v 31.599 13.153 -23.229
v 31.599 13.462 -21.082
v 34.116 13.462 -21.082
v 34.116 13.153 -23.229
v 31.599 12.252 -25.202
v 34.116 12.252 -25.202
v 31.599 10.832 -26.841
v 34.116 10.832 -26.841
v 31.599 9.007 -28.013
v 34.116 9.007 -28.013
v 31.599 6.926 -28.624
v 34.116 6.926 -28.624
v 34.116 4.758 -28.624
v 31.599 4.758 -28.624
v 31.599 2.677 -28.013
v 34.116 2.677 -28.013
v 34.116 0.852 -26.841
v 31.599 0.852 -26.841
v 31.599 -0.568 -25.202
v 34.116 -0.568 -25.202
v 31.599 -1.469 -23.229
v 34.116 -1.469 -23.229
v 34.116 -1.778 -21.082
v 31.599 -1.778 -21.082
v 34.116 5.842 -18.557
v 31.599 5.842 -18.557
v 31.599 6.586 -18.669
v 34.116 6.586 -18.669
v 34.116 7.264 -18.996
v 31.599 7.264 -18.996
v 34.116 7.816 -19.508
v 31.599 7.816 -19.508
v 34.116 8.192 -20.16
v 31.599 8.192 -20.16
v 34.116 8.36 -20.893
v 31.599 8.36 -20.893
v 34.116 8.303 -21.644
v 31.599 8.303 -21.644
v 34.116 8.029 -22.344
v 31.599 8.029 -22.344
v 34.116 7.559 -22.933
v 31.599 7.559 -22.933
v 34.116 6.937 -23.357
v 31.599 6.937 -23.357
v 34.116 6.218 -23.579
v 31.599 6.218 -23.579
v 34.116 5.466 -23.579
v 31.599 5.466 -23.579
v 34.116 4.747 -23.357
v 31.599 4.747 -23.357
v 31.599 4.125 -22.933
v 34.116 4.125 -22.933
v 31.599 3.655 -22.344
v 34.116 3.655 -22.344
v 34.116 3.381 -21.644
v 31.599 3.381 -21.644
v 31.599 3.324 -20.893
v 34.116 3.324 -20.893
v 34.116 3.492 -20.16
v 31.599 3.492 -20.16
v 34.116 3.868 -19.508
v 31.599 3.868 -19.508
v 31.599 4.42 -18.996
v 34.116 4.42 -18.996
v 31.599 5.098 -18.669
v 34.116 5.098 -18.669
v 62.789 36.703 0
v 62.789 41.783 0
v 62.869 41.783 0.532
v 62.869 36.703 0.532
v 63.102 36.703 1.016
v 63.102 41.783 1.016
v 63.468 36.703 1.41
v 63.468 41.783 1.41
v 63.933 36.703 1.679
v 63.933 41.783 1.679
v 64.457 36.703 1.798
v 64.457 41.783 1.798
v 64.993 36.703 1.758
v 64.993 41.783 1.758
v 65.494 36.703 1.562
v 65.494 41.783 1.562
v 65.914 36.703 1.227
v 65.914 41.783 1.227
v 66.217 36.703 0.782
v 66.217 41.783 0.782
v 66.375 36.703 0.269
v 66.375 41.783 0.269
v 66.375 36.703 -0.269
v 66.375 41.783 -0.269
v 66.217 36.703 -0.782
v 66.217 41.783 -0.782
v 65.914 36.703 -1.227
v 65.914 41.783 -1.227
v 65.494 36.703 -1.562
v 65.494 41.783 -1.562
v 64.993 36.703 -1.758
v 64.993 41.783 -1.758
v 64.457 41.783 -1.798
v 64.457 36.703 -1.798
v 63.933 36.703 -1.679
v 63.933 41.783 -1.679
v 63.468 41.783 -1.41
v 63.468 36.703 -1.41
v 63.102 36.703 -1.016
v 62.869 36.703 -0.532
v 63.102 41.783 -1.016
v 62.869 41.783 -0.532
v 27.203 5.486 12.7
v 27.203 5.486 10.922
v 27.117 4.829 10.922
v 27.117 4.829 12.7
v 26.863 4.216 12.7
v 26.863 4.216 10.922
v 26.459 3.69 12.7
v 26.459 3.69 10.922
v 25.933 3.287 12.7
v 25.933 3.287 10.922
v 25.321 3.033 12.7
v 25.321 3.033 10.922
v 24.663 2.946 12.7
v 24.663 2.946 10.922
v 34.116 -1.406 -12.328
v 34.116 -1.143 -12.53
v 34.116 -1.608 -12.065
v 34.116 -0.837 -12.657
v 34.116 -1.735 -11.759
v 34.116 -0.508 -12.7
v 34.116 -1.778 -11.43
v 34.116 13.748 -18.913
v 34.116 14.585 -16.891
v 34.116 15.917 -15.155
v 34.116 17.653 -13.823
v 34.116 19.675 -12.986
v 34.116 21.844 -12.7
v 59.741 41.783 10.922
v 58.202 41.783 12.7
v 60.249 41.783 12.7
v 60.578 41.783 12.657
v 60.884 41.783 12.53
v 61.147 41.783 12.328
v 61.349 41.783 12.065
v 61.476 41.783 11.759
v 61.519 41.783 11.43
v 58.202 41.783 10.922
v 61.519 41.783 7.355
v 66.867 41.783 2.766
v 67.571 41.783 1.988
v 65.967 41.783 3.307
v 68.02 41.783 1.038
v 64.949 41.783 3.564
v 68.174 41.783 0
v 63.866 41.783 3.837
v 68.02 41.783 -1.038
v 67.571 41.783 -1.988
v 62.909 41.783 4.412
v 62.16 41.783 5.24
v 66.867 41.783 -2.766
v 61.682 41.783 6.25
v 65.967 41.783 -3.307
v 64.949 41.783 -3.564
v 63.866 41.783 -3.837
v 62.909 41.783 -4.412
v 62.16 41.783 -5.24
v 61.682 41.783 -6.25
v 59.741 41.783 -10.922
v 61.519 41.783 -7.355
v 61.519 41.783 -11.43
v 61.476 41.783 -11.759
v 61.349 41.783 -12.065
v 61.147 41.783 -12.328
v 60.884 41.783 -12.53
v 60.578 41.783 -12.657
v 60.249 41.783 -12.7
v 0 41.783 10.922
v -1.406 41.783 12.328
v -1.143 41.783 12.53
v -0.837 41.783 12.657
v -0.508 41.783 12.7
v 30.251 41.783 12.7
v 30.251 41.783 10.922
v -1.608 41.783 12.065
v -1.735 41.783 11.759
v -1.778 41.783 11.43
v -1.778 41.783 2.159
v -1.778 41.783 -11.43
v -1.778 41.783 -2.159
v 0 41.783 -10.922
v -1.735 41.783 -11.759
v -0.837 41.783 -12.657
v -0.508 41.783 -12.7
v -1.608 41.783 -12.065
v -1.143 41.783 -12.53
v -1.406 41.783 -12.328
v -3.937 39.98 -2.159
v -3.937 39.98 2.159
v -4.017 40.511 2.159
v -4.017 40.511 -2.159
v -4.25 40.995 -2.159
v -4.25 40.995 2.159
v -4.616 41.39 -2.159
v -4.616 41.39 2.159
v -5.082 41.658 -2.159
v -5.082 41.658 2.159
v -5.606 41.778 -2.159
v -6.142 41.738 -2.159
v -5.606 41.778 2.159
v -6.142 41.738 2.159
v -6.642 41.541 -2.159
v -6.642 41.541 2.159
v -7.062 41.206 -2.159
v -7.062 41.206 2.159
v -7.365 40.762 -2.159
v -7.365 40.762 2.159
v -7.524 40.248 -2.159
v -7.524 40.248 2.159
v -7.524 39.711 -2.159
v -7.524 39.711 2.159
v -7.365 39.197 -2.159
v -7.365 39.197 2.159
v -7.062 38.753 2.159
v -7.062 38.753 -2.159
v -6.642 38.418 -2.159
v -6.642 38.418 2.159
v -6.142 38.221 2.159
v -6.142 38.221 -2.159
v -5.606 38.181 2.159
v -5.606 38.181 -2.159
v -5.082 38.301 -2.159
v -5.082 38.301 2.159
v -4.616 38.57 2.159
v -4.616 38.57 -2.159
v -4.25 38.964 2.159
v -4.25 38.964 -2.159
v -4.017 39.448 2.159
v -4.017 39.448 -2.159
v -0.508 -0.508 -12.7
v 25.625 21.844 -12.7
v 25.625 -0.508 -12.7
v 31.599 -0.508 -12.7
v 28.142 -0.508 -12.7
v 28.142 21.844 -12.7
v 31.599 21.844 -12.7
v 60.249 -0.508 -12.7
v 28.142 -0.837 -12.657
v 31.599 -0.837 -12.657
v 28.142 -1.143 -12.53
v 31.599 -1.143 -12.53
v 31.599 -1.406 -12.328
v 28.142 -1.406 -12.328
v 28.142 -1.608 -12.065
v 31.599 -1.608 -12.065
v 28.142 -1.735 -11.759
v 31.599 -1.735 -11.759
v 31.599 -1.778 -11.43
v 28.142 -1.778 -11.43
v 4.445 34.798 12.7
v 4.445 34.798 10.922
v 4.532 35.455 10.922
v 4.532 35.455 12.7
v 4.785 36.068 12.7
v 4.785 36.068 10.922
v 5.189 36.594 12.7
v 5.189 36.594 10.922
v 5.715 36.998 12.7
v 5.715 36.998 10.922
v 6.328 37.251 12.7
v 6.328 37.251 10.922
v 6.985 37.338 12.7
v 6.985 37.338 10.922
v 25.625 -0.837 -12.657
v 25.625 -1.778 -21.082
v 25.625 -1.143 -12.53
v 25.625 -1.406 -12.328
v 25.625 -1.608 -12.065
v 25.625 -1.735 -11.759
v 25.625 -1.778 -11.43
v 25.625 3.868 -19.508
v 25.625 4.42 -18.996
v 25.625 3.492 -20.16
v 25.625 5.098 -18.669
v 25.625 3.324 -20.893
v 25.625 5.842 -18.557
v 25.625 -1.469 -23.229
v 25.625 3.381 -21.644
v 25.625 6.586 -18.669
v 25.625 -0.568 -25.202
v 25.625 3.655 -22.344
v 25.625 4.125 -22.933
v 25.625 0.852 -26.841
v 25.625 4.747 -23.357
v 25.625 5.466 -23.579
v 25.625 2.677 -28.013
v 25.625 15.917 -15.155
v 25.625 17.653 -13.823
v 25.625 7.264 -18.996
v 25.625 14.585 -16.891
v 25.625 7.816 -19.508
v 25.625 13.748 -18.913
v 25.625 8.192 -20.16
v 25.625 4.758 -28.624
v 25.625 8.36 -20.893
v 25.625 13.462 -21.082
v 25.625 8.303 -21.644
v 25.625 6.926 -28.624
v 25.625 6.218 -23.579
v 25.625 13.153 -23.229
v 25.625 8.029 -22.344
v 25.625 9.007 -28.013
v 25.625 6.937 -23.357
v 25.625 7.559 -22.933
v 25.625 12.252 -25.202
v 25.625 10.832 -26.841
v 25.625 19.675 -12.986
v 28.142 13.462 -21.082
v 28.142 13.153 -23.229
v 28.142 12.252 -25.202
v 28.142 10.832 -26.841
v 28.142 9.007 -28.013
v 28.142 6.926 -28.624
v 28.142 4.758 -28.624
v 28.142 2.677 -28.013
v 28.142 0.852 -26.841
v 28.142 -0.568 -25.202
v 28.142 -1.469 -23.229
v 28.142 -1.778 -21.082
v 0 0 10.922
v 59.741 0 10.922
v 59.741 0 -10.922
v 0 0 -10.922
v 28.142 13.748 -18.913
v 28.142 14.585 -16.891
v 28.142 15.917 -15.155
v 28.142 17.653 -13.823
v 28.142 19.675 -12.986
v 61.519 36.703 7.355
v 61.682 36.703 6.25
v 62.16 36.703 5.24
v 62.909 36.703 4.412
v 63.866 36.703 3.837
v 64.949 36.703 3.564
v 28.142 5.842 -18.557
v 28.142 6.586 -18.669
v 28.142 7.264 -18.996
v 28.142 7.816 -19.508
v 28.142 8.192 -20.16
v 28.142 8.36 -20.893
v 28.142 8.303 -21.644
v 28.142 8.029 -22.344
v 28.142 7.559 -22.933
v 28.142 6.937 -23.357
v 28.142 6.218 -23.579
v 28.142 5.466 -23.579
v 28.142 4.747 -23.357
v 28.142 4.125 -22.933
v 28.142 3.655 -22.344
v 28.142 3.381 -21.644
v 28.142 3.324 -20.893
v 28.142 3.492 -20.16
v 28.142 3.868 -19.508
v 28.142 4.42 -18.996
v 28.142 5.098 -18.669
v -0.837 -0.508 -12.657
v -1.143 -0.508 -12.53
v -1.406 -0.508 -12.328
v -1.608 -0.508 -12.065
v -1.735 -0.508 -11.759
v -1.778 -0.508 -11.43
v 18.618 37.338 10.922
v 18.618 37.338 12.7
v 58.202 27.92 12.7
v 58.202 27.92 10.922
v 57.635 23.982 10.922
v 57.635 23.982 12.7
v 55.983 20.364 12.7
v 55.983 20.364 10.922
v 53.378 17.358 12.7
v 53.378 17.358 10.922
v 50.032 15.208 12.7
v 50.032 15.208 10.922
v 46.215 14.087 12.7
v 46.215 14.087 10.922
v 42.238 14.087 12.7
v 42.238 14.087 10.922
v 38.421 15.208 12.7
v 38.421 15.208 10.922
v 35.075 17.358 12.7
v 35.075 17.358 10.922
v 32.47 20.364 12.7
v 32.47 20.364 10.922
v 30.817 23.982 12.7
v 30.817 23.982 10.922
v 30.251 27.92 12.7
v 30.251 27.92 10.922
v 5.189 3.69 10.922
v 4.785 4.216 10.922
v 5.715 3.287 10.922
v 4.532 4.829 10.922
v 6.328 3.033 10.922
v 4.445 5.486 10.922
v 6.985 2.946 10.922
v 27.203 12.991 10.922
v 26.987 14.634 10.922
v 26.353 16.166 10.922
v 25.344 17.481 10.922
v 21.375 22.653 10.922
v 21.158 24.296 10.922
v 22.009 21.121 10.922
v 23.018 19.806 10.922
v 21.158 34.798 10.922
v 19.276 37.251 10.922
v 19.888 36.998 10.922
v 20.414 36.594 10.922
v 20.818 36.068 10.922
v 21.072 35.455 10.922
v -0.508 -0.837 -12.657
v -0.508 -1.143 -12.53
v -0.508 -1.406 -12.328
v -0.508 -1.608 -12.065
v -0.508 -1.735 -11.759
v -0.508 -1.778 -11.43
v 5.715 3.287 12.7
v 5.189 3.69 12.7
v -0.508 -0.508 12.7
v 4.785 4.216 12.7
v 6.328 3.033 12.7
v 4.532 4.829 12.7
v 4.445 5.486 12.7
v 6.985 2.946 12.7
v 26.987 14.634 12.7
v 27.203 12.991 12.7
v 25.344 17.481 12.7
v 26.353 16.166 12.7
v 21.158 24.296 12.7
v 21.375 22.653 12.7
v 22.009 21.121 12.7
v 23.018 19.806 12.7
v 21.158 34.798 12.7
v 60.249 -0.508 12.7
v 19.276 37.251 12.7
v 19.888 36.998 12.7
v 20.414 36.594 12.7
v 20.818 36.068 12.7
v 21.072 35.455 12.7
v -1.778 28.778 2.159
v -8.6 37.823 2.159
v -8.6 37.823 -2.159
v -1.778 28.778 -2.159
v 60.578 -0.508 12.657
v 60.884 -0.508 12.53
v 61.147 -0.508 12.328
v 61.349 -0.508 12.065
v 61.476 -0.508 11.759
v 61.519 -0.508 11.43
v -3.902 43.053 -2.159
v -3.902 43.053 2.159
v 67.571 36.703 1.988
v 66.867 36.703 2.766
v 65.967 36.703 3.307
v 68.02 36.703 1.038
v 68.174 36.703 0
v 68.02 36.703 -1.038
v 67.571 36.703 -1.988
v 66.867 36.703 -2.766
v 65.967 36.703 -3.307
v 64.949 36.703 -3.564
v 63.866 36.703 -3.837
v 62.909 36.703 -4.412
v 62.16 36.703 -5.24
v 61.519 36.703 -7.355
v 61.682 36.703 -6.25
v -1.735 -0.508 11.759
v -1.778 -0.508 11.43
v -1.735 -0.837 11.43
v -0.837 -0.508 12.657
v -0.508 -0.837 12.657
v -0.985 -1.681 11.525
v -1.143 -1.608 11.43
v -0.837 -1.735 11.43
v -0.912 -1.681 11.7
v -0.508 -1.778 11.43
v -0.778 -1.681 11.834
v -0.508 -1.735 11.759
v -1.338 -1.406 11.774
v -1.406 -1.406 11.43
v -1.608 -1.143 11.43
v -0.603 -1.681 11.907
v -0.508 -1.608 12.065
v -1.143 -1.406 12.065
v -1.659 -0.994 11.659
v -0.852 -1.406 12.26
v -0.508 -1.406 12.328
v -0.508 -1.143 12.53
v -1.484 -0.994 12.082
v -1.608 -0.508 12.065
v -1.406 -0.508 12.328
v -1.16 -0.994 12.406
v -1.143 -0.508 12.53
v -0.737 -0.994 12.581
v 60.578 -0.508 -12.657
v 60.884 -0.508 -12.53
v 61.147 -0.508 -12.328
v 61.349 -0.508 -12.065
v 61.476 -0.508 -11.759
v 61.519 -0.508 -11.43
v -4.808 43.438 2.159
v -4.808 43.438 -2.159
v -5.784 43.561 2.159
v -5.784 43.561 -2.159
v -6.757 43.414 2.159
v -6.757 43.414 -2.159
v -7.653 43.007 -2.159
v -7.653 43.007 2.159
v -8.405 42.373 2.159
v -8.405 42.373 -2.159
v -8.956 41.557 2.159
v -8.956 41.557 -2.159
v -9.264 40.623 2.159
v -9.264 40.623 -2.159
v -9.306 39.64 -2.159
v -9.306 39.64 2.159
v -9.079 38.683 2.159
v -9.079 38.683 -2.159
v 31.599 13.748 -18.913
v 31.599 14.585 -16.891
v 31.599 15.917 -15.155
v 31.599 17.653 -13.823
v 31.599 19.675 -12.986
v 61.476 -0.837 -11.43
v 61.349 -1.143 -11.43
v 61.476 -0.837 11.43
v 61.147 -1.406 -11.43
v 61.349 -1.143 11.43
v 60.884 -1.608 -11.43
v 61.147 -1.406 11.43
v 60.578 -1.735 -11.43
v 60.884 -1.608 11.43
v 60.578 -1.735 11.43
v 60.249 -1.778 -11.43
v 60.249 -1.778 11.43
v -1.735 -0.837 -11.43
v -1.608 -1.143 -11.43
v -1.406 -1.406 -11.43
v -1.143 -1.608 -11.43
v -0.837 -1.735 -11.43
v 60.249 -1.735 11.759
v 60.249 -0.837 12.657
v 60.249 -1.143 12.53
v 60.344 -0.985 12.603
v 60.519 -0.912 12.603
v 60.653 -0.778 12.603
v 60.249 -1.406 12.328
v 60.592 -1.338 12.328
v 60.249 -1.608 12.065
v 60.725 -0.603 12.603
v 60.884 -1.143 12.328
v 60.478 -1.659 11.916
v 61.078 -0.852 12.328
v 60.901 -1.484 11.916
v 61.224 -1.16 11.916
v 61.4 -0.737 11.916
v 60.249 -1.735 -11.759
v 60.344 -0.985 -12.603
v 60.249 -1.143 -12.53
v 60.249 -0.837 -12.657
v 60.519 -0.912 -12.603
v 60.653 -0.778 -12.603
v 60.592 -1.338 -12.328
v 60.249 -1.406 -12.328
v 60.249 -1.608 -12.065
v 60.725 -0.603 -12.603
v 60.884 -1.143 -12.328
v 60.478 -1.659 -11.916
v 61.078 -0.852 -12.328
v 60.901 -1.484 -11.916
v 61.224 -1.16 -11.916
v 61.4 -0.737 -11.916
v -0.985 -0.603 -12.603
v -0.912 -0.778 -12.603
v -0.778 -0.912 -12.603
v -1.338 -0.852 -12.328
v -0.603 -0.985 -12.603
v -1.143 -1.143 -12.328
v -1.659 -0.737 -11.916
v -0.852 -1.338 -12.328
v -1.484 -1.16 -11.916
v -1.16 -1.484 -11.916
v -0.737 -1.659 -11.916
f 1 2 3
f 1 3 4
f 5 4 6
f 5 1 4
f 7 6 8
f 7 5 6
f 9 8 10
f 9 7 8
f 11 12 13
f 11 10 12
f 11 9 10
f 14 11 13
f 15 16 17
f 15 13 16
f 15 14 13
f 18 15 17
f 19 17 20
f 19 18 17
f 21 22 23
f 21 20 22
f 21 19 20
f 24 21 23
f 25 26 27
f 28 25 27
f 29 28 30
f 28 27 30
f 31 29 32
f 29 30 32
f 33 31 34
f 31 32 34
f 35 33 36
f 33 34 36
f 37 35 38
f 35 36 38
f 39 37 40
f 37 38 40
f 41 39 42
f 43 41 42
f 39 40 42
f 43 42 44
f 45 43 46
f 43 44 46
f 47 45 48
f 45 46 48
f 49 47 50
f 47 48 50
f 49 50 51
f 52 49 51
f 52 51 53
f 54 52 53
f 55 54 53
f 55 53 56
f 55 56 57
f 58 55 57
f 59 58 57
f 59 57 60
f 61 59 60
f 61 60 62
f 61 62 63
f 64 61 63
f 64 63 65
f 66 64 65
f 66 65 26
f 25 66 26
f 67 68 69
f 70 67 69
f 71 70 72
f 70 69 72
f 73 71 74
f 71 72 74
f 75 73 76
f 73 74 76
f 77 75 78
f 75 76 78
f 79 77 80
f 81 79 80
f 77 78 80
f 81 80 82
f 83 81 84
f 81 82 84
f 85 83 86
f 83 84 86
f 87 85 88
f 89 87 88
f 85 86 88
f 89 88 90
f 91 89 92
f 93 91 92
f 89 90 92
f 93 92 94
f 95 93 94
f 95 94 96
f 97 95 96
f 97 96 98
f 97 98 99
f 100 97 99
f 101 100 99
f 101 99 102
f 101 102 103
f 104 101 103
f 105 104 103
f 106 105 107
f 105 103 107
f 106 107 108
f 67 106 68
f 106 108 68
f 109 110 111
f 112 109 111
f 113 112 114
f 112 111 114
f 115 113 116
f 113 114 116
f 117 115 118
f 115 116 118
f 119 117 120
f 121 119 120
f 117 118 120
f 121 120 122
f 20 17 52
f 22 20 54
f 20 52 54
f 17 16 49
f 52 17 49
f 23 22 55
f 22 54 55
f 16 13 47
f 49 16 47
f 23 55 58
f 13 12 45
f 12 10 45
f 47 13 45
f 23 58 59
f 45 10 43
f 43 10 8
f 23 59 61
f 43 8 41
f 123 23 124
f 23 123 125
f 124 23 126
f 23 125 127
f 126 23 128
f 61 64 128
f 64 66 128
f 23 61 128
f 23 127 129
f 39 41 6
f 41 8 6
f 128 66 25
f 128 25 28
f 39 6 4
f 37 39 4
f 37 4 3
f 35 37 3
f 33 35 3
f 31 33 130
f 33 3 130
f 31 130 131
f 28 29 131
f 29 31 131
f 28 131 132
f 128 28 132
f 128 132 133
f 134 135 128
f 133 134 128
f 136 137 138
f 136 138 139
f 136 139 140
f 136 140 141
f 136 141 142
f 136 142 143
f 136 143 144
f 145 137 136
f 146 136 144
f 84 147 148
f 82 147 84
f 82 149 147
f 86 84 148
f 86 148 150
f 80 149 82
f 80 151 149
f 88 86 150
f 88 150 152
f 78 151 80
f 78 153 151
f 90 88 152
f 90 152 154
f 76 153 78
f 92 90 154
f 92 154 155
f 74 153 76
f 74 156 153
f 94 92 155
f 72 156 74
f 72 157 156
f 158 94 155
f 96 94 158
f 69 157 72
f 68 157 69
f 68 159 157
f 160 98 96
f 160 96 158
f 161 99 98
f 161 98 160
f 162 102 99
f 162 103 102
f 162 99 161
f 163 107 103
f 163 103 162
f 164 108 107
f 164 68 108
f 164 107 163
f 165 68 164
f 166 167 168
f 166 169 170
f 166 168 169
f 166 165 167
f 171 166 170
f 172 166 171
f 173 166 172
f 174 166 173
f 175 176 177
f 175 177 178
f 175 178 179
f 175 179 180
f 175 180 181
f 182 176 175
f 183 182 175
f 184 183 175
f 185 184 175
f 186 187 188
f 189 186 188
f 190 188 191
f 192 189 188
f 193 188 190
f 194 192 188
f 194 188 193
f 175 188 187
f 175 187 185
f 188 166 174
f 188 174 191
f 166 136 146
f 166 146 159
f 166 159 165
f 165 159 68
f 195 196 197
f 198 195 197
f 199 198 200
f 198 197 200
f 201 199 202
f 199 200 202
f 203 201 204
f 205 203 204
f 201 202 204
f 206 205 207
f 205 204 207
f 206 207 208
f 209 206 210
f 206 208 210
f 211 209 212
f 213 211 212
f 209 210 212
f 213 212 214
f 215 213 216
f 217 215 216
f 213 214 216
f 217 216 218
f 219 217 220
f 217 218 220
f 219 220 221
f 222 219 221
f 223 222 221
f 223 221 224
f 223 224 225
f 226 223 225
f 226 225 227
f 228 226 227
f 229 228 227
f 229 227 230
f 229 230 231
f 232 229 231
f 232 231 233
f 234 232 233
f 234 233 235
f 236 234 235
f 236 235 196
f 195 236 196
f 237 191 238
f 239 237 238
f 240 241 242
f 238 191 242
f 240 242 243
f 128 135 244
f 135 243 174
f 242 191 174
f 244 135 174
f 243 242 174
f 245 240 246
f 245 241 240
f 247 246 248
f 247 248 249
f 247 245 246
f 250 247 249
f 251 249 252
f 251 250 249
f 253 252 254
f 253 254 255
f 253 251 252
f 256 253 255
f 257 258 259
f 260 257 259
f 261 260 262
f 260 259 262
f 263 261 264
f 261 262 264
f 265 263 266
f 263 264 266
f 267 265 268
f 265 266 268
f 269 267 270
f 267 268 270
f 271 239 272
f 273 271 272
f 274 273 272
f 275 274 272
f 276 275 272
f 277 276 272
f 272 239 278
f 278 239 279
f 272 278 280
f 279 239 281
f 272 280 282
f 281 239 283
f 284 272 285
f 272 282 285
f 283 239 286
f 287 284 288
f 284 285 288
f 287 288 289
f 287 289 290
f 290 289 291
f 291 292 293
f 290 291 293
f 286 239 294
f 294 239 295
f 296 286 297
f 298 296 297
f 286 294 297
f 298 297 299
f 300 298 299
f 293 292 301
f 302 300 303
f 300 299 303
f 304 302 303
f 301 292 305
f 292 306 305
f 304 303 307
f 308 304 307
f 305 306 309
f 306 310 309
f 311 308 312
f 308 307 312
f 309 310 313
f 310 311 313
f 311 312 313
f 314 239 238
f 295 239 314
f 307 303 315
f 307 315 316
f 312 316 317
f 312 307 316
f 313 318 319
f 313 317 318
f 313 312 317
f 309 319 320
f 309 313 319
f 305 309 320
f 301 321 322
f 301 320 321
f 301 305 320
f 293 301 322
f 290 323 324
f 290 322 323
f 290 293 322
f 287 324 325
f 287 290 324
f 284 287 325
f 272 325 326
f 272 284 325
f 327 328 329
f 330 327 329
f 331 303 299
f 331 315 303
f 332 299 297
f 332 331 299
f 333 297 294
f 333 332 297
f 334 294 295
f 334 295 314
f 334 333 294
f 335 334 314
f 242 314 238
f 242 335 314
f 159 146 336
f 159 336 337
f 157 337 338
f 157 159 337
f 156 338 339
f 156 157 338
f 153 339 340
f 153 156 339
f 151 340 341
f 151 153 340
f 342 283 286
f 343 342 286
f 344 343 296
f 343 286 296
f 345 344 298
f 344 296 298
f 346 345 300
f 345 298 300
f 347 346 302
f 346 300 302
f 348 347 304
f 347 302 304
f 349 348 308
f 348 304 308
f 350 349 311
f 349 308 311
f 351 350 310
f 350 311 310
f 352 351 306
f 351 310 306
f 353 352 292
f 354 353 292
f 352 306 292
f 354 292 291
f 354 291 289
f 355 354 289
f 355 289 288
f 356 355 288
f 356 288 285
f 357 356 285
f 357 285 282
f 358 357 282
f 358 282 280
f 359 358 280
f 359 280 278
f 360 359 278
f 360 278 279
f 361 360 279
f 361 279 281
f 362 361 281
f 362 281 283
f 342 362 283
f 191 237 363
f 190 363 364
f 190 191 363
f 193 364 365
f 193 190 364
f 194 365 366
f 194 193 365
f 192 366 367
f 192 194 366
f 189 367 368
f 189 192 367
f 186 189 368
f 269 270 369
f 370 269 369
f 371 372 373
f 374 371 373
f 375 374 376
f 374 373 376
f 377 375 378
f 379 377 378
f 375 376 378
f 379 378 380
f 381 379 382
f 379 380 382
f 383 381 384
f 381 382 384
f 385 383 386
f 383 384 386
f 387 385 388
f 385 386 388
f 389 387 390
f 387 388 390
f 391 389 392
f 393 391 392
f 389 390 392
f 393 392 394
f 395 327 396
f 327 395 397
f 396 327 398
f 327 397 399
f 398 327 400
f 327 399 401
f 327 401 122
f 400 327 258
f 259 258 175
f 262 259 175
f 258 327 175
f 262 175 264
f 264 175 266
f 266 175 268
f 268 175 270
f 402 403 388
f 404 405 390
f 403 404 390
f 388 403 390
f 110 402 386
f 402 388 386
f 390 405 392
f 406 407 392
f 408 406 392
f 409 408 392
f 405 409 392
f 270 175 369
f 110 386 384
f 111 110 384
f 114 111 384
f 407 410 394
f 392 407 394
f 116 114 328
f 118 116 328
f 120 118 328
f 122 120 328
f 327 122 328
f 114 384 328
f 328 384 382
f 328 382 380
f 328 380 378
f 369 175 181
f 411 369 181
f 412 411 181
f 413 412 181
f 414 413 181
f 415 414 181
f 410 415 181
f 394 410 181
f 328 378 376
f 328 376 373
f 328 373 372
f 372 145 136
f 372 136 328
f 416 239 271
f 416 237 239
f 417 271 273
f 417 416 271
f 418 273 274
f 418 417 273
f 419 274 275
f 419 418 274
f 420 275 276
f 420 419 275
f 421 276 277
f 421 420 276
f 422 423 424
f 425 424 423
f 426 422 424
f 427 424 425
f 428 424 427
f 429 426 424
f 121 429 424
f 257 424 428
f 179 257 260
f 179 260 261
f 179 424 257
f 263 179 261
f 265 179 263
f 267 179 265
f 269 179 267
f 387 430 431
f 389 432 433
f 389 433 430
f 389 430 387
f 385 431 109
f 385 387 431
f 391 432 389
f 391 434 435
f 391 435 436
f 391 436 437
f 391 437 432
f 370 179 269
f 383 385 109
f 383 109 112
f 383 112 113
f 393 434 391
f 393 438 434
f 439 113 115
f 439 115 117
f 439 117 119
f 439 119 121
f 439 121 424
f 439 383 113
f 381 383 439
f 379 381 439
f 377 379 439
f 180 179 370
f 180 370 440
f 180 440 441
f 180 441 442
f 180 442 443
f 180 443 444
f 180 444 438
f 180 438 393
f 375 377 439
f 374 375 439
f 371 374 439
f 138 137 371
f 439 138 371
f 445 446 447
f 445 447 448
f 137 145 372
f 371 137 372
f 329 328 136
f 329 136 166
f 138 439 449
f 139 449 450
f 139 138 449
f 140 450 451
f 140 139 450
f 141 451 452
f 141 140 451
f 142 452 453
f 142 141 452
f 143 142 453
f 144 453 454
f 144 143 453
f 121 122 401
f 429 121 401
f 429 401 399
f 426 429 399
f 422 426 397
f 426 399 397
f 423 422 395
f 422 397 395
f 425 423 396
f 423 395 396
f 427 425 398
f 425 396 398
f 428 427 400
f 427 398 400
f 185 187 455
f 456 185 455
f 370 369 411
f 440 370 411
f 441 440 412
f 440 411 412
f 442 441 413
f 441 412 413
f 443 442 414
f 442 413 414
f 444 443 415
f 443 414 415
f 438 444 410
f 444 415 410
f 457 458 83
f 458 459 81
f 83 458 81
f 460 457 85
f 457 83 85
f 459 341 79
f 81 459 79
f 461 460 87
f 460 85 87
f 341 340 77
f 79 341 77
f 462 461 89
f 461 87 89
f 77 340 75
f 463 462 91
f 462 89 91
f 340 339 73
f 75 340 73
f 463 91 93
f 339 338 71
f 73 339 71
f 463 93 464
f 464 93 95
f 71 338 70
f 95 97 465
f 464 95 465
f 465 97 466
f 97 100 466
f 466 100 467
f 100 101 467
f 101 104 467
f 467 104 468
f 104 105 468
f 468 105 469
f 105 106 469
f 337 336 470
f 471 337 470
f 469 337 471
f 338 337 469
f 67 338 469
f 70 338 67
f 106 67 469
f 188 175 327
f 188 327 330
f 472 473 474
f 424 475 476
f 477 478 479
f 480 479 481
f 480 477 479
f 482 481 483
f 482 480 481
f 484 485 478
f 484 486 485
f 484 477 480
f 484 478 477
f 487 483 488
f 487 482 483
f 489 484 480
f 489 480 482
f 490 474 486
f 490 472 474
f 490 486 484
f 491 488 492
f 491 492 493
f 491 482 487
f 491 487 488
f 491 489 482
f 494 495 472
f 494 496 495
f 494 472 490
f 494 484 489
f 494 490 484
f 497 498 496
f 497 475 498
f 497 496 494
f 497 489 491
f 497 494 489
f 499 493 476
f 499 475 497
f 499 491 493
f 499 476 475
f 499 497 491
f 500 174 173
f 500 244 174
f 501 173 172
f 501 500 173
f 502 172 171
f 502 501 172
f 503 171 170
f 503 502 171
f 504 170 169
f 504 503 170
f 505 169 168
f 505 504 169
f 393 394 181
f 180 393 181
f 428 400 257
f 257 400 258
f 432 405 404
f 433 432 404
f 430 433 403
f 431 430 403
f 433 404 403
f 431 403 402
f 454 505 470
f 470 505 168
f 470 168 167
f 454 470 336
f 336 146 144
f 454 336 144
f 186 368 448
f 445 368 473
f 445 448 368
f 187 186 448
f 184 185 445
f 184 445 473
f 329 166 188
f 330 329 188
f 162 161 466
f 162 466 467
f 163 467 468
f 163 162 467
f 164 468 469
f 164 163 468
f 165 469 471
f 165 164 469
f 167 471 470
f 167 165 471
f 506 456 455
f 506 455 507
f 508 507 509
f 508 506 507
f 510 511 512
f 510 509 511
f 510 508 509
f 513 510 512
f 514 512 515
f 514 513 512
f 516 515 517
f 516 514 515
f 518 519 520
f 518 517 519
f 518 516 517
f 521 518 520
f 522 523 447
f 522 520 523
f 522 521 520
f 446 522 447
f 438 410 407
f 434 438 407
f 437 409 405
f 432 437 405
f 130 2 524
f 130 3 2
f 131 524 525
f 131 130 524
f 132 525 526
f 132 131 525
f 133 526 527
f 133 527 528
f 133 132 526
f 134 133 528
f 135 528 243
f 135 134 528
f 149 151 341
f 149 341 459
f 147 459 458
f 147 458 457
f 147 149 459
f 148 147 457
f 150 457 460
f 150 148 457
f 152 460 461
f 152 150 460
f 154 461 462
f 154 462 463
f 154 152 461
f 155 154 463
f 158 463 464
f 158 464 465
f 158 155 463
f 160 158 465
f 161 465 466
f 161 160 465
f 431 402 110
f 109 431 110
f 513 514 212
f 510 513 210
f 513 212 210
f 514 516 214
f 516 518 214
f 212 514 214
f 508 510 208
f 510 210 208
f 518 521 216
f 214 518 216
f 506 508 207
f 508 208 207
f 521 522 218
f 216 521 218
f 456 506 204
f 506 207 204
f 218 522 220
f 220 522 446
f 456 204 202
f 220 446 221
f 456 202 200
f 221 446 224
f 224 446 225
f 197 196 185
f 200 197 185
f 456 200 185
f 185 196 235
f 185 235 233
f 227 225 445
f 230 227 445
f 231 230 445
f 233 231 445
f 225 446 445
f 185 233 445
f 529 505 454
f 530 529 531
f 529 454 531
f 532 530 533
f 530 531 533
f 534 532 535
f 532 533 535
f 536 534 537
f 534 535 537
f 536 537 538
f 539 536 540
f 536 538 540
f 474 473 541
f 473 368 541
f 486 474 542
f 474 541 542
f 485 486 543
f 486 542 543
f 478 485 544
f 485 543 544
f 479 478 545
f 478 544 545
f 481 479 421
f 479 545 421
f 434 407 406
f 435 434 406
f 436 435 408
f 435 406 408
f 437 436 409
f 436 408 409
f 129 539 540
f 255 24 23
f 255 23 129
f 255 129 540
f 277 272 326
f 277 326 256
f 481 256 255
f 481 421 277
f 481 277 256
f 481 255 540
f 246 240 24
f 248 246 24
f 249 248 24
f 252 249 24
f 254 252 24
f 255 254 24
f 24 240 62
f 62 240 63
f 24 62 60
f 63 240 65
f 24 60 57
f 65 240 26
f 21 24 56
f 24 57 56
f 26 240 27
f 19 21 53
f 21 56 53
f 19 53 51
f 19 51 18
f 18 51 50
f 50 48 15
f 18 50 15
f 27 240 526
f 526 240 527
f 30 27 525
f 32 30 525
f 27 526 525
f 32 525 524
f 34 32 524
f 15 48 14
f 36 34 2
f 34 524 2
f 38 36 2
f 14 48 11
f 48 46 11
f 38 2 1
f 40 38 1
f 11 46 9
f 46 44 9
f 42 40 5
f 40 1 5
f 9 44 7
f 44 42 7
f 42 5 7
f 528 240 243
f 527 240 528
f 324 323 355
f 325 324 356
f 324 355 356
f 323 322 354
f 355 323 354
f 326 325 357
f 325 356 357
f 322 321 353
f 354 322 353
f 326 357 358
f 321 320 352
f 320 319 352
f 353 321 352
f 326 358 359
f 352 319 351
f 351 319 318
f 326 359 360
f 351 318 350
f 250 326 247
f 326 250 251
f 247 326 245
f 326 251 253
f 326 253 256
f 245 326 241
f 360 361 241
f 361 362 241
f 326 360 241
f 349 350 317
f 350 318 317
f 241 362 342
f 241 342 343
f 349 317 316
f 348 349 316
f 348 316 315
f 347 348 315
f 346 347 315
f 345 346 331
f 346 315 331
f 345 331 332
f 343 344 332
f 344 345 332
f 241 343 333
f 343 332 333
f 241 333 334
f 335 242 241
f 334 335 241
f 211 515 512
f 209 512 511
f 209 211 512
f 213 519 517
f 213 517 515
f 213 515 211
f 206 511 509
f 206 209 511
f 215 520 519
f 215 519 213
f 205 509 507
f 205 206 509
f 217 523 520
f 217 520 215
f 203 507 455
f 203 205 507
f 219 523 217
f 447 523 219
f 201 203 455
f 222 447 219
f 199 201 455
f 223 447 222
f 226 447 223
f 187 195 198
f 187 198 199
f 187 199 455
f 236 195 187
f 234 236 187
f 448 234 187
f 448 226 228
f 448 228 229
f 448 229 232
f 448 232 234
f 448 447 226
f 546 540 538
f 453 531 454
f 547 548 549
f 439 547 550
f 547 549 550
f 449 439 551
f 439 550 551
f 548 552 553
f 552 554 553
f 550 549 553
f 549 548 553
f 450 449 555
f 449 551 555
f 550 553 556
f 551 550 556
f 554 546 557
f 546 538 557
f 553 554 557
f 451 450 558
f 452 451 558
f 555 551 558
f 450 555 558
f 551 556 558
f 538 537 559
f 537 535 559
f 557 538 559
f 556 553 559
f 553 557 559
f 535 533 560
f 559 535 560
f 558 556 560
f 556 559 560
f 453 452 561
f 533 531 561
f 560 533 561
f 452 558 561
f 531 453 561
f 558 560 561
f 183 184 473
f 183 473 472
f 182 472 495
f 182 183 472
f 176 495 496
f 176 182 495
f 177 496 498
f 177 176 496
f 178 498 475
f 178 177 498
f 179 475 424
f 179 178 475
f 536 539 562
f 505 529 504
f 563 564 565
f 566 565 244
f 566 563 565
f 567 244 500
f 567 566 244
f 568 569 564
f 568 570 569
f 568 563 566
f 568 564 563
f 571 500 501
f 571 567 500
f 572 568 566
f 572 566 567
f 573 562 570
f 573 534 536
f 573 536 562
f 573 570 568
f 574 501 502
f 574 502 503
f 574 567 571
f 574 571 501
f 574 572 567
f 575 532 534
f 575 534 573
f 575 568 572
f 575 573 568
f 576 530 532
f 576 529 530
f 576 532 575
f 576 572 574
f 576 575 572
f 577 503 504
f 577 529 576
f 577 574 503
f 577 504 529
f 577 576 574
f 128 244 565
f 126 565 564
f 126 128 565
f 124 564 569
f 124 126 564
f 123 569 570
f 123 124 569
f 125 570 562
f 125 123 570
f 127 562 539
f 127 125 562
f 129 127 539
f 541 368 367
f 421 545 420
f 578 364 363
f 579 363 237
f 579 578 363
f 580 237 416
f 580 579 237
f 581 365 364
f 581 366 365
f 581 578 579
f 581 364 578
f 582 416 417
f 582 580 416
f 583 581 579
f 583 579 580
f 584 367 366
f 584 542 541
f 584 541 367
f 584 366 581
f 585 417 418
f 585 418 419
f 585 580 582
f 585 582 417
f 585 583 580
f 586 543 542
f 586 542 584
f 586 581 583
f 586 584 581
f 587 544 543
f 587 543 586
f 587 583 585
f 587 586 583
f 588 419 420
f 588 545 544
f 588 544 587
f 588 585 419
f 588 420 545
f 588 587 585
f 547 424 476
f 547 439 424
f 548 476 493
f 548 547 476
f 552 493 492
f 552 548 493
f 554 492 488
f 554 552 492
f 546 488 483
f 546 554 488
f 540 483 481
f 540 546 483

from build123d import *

# Parameters (mm, degrees)
SKETCH3_W               = 1.778
SKETCH3_H               = 21.844
SKETCH4_W               = 63.2968
SKETCH4_H               = 43.561
BOSS_EXTRUDE1_DEPTH     = 1.778
BOSS_EXTRUDE2_DEPTH     = 1.778
SKETCH6_R               = 1.8034
BOSS_EXTRUDE3_DEPTH     = 5.08
FILLET2_R               = 3.81
SKETCH7_R               = 1.8034
BOSS_EXTRUDE4_DEPTH     = 25.4
CUT_EXTRUDE1_DEPTH      = 82.893164904
CUT_EXTRUDE1_DEPTH_BACK = 82.893164904
SKETCH8_W               = 7.5438
SKETCH8_H               = 10.541
SKETCH13_R              = 2.52476
BOSS_EXTRUDE5_DEPTH     = 63.2968
SKETCH14_W              = 27.40279
SKETCH14_H              = 7.62
SKETCH14_H_2            = 8.382
SKETCH14_W_2            = 3.45694
CUT_EXTRUDE2_DEPTH      = 80.858589657
FILLET3_R               = 8.382
FILLET4_R               = 1.27


# Some blends are built 0.0001 mm under size
with BuildPart() as part:
    # Sweep1: sweep along a path in Sketch1
    with BuildLine(Plane.XY) as sweep1_path:
        Line((0, 41.783), (0, 0))
        Line((0, 0), (59.7408, 0))
        Line((59.7408, 0), (59.7408, 41.783))
    # Sketch3 → Sweep1 (sweep)
    with BuildSketch(Plane(origin=(0, 41.783, 0), x_dir=(1, 0, 0), z_dir=(0, 1, 0))):
        with Locations((-0.889, 0)):
            Rectangle(SKETCH3_W, SKETCH3_H)
    sweep(path=sweep1_path.line, transition=Transition.RIGHT)

    # Sketch4 → Boss-Extrude1 (add)
    with BuildSketch(Plane(origin=(0, 0, -10.922), x_dir=(-1, 0, 0), z_dir=(0, 0, -1))):
        with Locations((-29.8704, 20.0025)):
            Rectangle(SKETCH4_W, SKETCH4_H)
    extrude(amount=BOSS_EXTRUDE1_DEPTH)

    # Sketch5 → Boss-Extrude2 (add)
    # profile 1 of 2: a face of its own
    with BuildSketch(Plane.XY.offset(10.922)):
        with BuildLine():
            Line((30.2514, 41.783), (0, 41.783))
            Line((0, 41.783), (0, 0))
            Line((0, 0), (59.7408, 0))
            Line((59.7408, 0), (59.7408, 41.783))
            Line((59.7408, 41.783), (58.20156, 41.783))
            Line((58.20156, 41.783), (58.20156, 27.91968))
            ThreePointArc((58.20156, 27.91968), (44.22648, 13.9446), (30.2514, 27.91968))
            Line((30.2514, 27.91968), (30.2514, 41.783))
        make_face()
        with BuildLine():
            Line((4.445, 5.4864), (4.445, 34.798))
            ThreePointArc((4.445, 34.798), (5.188948776, 36.594051224), (6.985, 37.338))
            Line((6.985, 37.338), (18.6182, 37.338))
            ThreePointArc((18.6182, 37.338), (20.414251224, 36.594051224), (21.1582, 34.798))
            Line((21.1582, 34.798), (21.1582, 24.296354404))
            ThreePointArc((21.1582, 24.296354404), (21.641564969, 21.866314608), (23.018071939, 19.806226343))
            Line((23.018071939, 19.806226343), (25.343528061, 17.480770222))
            ThreePointArc((25.343528061, 17.480770222), (26.720035031, 15.420681957), (27.2034, 12.990642162))
            Line((27.2034, 12.990642162), (27.2034, 5.4864))
            ThreePointArc((27.2034, 5.4864), (26.459451224, 3.690348776), (24.6634, 2.9464))
            Line((24.6634, 2.9464), (6.985, 2.9464))
            ThreePointArc((6.985, 2.9464), (5.188948776, 3.690348776), (4.445, 5.4864))
        make_face(mode=Mode.SUBTRACT)
    # profile 2 of 2: a face of its own
    with BuildSketch(Plane.XY.offset(10.922)):
        Polygon((61.5188, 41.783), (59.7408, 41.783), (59.7408, 0), (0, 0), (0, 41.783), (-1.778, 41.783), (-1.778, -1.778), (61.5188, -1.778), align=None)
    extrude(amount=BOSS_EXTRUDE2_DEPTH)

    # Sketch6 → Boss-Extrude3 (add)
    with BuildSketch(Plane(origin=(0, 41.783, 0), x_dir=(1, 0, 0), z_dir=(0, 1, 0))):
        with BuildLine():
            Line((64.5922, 3.5814), (61.5188, 3.5814))
            Line((61.5188, 3.5814), (61.5188, -3.5814))
            Line((61.5188, -3.5814), (64.5922, -3.5814))
            ThreePointArc((64.5922, -3.5814), (68.1736, 0), (64.5922, 3.5814))
        make_face()
        with Locations(Location((64.5922, 0, 0), (0, 0, 180))):
            Circle(SKETCH6_R, mode=Mode.SUBTRACT)
    extrude(amount=-BOSS_EXTRUDE3_DEPTH)

    # Fillet2
    # the kernel refuses this fillet: 3.81 mm, written as the material it adds along each edge
    with BuildSketch(Plane(origin=(61.5188, 41.783, -3.5814), x_dir=(0, 0, -1), z_dir=(0, -1, 0))) as fillet2_piece_1:
        with BuildLine():
            CenterArc((3.773204979, 3.81), FILLET2_R, 185.719382358, 84.280617642)
            Line((-0.017828515, 3.430309278), (-0.396931865, 3.392340206))
            ThreePointArc((-0.396931865, 3.392340206), (-0.381, 3.0734), (-0.381, 0))
            Line((-0.381, 0), (0, -0.381))
            Line((0, -0.381), (3.773204979, -0.381))
            Line((3.773204979, -0.381), (3.773204979, 0))
        make_face()
    extrude(amount=5.08)
    with BuildSketch(Plane(origin=(61.5188, 41.783, 3.5814), x_dir=(0, 0, 1), z_dir=(0, -1, 0))) as fillet2_piece_2:
        with BuildLine():
            CenterArc((3.773204979, -3.81), FILLET2_R, 90, 84.280617642)
            Line((-0.017828515, -3.430309278), (-0.396931865, -3.392340206))
            ThreePointArc((-0.396931865, -3.392340206), (-0.381, -3.0734), (-0.381, 0))
            Line((-0.381, 0), (0, 0.381))
            Line((0, 0.381), (3.773204979, 0.381))
            Line((3.773204979, 0.381), (3.773204979, 0))
        make_face()
    extrude(amount=5.08)

    # Sketch7 → Boss-Extrude4 (add)
    with BuildSketch(Plane.XY.offset(12.7)):
        with BuildLine():
            Line((-1.778, 36.3982), (-1.778, 41.783))
            Line((-1.778, 41.783), (-3.902308892, 43.053335031))
            ThreePointArc((-3.902308892, 43.053335031), (-8.404920605, 42.372664125), (-8.599730754, 37.82306259))
            Line((-8.599730754, 37.82306259), (-1.778, 28.7782))
            Line((-1.778, 28.7782), (-1.778, 36.3982))
        make_face()
        with Locations((-5.7404, 39.9796)):
            Circle(SKETCH7_R, mode=Mode.SUBTRACT)
    extrude(amount=-BOSS_EXTRUDE4_DEPTH)

    # Sketch8 → Cut-Extrude1 (cut, two sides: drawn at the far end of the back side and taken through both)
    with BuildSketch(Plane(origin=(0, 41.783, 0), x_dir=(1, 0, 0), z_dir=(0, 1, 0)).offset(-CUT_EXTRUDE1_DEPTH_BACK)):
        with Locations((-5.5499, 7.4295)):
            Rectangle(SKETCH8_W, SKETCH8_H)
        with Locations((-5.5499, -7.4295)):
            Rectangle(SKETCH8_W, SKETCH8_H)
    extrude(amount=CUT_EXTRUDE1_DEPTH + CUT_EXTRUDE1_DEPTH_BACK, mode=Mode.SUBTRACT)

    # Sketch13 → Boss-Extrude5 (add)
    with BuildSketch(Plane.ZY.offset(1.778)):
        with BuildLine():
            Line((-21.082, -1.778), (-12.7, -1.778))
            Line((-12.7, -1.778), (-12.7, 13.462))
            Line((-12.7, 13.462), (-21.082, 13.462))
            ThreePointArc((-21.082, 13.462), (-28.702, 5.842), (-21.082, -1.778))
        make_face()
        with Locations((-21.082, 5.842)):
            Circle(SKETCH13_R, mode=Mode.SUBTRACT)
    extrude(amount=-BOSS_EXTRUDE5_DEPTH)

    # Sketch14 → Cut-Extrude2 (cut, through all)
    with BuildSketch(Plane(origin=(0, 13.462, 0), x_dir=(1, 0, 0), z_dir=(0, 1, 0))):
        with Locations((11.923395, 24.892)):
            Rectangle(SKETCH14_W, SKETCH14_H)
        with Locations((11.923395, 16.891)):
            Rectangle(SKETCH14_W, SKETCH14_H_2)
        with Locations((47.817405, 16.891)):
            Rectangle(SKETCH14_W, SKETCH14_H_2)
        with Locations((47.817405, 24.892)):
            Rectangle(SKETCH14_W, SKETCH14_H)
        with Locations((29.8704, 24.892)):
            Rectangle(SKETCH14_W_2, SKETCH14_H)
        with Locations((29.8704, 16.891)):
            Rectangle(SKETCH14_W_2, SKETCH14_H_2)
    extrude(amount=-CUT_EXTRUDE2_DEPTH, mode=Mode.SUBTRACT)

    # Fillet3
    fillet3_edges = [part.edges().sort_by_distance(p)[0] for p in [
        (26.88336, 13.462, -12.7),
        (32.85744, 13.462, -12.7),
    ]]
    fillet(fillet3_edges, radius=FILLET3_R - 0.0001)  # a hair under: the kernel refuses the full size

    # Fillet4
    fillet4_edges = [part.edges().sort_by_distance(p)[0] for p in [
        (61.5188, -1.778, 0),
        (-1.778, 20.0025, 12.7),
        (-1.778, -1.778, 0),
        (-1.778, 20.0025, -12.7),
        (11.923395, -1.778, -12.7),
        (47.817405, -1.778, -12.7),
        (29.8704, -1.778, -12.7),
        (61.5188, 20.0025, -12.7),
        (29.8704, -1.778, 12.7),
        (61.5188, 20.0025, 12.7),
    ]]
    fillet(fillet4_edges, radius=FILLET4_R)


solid = part.part
